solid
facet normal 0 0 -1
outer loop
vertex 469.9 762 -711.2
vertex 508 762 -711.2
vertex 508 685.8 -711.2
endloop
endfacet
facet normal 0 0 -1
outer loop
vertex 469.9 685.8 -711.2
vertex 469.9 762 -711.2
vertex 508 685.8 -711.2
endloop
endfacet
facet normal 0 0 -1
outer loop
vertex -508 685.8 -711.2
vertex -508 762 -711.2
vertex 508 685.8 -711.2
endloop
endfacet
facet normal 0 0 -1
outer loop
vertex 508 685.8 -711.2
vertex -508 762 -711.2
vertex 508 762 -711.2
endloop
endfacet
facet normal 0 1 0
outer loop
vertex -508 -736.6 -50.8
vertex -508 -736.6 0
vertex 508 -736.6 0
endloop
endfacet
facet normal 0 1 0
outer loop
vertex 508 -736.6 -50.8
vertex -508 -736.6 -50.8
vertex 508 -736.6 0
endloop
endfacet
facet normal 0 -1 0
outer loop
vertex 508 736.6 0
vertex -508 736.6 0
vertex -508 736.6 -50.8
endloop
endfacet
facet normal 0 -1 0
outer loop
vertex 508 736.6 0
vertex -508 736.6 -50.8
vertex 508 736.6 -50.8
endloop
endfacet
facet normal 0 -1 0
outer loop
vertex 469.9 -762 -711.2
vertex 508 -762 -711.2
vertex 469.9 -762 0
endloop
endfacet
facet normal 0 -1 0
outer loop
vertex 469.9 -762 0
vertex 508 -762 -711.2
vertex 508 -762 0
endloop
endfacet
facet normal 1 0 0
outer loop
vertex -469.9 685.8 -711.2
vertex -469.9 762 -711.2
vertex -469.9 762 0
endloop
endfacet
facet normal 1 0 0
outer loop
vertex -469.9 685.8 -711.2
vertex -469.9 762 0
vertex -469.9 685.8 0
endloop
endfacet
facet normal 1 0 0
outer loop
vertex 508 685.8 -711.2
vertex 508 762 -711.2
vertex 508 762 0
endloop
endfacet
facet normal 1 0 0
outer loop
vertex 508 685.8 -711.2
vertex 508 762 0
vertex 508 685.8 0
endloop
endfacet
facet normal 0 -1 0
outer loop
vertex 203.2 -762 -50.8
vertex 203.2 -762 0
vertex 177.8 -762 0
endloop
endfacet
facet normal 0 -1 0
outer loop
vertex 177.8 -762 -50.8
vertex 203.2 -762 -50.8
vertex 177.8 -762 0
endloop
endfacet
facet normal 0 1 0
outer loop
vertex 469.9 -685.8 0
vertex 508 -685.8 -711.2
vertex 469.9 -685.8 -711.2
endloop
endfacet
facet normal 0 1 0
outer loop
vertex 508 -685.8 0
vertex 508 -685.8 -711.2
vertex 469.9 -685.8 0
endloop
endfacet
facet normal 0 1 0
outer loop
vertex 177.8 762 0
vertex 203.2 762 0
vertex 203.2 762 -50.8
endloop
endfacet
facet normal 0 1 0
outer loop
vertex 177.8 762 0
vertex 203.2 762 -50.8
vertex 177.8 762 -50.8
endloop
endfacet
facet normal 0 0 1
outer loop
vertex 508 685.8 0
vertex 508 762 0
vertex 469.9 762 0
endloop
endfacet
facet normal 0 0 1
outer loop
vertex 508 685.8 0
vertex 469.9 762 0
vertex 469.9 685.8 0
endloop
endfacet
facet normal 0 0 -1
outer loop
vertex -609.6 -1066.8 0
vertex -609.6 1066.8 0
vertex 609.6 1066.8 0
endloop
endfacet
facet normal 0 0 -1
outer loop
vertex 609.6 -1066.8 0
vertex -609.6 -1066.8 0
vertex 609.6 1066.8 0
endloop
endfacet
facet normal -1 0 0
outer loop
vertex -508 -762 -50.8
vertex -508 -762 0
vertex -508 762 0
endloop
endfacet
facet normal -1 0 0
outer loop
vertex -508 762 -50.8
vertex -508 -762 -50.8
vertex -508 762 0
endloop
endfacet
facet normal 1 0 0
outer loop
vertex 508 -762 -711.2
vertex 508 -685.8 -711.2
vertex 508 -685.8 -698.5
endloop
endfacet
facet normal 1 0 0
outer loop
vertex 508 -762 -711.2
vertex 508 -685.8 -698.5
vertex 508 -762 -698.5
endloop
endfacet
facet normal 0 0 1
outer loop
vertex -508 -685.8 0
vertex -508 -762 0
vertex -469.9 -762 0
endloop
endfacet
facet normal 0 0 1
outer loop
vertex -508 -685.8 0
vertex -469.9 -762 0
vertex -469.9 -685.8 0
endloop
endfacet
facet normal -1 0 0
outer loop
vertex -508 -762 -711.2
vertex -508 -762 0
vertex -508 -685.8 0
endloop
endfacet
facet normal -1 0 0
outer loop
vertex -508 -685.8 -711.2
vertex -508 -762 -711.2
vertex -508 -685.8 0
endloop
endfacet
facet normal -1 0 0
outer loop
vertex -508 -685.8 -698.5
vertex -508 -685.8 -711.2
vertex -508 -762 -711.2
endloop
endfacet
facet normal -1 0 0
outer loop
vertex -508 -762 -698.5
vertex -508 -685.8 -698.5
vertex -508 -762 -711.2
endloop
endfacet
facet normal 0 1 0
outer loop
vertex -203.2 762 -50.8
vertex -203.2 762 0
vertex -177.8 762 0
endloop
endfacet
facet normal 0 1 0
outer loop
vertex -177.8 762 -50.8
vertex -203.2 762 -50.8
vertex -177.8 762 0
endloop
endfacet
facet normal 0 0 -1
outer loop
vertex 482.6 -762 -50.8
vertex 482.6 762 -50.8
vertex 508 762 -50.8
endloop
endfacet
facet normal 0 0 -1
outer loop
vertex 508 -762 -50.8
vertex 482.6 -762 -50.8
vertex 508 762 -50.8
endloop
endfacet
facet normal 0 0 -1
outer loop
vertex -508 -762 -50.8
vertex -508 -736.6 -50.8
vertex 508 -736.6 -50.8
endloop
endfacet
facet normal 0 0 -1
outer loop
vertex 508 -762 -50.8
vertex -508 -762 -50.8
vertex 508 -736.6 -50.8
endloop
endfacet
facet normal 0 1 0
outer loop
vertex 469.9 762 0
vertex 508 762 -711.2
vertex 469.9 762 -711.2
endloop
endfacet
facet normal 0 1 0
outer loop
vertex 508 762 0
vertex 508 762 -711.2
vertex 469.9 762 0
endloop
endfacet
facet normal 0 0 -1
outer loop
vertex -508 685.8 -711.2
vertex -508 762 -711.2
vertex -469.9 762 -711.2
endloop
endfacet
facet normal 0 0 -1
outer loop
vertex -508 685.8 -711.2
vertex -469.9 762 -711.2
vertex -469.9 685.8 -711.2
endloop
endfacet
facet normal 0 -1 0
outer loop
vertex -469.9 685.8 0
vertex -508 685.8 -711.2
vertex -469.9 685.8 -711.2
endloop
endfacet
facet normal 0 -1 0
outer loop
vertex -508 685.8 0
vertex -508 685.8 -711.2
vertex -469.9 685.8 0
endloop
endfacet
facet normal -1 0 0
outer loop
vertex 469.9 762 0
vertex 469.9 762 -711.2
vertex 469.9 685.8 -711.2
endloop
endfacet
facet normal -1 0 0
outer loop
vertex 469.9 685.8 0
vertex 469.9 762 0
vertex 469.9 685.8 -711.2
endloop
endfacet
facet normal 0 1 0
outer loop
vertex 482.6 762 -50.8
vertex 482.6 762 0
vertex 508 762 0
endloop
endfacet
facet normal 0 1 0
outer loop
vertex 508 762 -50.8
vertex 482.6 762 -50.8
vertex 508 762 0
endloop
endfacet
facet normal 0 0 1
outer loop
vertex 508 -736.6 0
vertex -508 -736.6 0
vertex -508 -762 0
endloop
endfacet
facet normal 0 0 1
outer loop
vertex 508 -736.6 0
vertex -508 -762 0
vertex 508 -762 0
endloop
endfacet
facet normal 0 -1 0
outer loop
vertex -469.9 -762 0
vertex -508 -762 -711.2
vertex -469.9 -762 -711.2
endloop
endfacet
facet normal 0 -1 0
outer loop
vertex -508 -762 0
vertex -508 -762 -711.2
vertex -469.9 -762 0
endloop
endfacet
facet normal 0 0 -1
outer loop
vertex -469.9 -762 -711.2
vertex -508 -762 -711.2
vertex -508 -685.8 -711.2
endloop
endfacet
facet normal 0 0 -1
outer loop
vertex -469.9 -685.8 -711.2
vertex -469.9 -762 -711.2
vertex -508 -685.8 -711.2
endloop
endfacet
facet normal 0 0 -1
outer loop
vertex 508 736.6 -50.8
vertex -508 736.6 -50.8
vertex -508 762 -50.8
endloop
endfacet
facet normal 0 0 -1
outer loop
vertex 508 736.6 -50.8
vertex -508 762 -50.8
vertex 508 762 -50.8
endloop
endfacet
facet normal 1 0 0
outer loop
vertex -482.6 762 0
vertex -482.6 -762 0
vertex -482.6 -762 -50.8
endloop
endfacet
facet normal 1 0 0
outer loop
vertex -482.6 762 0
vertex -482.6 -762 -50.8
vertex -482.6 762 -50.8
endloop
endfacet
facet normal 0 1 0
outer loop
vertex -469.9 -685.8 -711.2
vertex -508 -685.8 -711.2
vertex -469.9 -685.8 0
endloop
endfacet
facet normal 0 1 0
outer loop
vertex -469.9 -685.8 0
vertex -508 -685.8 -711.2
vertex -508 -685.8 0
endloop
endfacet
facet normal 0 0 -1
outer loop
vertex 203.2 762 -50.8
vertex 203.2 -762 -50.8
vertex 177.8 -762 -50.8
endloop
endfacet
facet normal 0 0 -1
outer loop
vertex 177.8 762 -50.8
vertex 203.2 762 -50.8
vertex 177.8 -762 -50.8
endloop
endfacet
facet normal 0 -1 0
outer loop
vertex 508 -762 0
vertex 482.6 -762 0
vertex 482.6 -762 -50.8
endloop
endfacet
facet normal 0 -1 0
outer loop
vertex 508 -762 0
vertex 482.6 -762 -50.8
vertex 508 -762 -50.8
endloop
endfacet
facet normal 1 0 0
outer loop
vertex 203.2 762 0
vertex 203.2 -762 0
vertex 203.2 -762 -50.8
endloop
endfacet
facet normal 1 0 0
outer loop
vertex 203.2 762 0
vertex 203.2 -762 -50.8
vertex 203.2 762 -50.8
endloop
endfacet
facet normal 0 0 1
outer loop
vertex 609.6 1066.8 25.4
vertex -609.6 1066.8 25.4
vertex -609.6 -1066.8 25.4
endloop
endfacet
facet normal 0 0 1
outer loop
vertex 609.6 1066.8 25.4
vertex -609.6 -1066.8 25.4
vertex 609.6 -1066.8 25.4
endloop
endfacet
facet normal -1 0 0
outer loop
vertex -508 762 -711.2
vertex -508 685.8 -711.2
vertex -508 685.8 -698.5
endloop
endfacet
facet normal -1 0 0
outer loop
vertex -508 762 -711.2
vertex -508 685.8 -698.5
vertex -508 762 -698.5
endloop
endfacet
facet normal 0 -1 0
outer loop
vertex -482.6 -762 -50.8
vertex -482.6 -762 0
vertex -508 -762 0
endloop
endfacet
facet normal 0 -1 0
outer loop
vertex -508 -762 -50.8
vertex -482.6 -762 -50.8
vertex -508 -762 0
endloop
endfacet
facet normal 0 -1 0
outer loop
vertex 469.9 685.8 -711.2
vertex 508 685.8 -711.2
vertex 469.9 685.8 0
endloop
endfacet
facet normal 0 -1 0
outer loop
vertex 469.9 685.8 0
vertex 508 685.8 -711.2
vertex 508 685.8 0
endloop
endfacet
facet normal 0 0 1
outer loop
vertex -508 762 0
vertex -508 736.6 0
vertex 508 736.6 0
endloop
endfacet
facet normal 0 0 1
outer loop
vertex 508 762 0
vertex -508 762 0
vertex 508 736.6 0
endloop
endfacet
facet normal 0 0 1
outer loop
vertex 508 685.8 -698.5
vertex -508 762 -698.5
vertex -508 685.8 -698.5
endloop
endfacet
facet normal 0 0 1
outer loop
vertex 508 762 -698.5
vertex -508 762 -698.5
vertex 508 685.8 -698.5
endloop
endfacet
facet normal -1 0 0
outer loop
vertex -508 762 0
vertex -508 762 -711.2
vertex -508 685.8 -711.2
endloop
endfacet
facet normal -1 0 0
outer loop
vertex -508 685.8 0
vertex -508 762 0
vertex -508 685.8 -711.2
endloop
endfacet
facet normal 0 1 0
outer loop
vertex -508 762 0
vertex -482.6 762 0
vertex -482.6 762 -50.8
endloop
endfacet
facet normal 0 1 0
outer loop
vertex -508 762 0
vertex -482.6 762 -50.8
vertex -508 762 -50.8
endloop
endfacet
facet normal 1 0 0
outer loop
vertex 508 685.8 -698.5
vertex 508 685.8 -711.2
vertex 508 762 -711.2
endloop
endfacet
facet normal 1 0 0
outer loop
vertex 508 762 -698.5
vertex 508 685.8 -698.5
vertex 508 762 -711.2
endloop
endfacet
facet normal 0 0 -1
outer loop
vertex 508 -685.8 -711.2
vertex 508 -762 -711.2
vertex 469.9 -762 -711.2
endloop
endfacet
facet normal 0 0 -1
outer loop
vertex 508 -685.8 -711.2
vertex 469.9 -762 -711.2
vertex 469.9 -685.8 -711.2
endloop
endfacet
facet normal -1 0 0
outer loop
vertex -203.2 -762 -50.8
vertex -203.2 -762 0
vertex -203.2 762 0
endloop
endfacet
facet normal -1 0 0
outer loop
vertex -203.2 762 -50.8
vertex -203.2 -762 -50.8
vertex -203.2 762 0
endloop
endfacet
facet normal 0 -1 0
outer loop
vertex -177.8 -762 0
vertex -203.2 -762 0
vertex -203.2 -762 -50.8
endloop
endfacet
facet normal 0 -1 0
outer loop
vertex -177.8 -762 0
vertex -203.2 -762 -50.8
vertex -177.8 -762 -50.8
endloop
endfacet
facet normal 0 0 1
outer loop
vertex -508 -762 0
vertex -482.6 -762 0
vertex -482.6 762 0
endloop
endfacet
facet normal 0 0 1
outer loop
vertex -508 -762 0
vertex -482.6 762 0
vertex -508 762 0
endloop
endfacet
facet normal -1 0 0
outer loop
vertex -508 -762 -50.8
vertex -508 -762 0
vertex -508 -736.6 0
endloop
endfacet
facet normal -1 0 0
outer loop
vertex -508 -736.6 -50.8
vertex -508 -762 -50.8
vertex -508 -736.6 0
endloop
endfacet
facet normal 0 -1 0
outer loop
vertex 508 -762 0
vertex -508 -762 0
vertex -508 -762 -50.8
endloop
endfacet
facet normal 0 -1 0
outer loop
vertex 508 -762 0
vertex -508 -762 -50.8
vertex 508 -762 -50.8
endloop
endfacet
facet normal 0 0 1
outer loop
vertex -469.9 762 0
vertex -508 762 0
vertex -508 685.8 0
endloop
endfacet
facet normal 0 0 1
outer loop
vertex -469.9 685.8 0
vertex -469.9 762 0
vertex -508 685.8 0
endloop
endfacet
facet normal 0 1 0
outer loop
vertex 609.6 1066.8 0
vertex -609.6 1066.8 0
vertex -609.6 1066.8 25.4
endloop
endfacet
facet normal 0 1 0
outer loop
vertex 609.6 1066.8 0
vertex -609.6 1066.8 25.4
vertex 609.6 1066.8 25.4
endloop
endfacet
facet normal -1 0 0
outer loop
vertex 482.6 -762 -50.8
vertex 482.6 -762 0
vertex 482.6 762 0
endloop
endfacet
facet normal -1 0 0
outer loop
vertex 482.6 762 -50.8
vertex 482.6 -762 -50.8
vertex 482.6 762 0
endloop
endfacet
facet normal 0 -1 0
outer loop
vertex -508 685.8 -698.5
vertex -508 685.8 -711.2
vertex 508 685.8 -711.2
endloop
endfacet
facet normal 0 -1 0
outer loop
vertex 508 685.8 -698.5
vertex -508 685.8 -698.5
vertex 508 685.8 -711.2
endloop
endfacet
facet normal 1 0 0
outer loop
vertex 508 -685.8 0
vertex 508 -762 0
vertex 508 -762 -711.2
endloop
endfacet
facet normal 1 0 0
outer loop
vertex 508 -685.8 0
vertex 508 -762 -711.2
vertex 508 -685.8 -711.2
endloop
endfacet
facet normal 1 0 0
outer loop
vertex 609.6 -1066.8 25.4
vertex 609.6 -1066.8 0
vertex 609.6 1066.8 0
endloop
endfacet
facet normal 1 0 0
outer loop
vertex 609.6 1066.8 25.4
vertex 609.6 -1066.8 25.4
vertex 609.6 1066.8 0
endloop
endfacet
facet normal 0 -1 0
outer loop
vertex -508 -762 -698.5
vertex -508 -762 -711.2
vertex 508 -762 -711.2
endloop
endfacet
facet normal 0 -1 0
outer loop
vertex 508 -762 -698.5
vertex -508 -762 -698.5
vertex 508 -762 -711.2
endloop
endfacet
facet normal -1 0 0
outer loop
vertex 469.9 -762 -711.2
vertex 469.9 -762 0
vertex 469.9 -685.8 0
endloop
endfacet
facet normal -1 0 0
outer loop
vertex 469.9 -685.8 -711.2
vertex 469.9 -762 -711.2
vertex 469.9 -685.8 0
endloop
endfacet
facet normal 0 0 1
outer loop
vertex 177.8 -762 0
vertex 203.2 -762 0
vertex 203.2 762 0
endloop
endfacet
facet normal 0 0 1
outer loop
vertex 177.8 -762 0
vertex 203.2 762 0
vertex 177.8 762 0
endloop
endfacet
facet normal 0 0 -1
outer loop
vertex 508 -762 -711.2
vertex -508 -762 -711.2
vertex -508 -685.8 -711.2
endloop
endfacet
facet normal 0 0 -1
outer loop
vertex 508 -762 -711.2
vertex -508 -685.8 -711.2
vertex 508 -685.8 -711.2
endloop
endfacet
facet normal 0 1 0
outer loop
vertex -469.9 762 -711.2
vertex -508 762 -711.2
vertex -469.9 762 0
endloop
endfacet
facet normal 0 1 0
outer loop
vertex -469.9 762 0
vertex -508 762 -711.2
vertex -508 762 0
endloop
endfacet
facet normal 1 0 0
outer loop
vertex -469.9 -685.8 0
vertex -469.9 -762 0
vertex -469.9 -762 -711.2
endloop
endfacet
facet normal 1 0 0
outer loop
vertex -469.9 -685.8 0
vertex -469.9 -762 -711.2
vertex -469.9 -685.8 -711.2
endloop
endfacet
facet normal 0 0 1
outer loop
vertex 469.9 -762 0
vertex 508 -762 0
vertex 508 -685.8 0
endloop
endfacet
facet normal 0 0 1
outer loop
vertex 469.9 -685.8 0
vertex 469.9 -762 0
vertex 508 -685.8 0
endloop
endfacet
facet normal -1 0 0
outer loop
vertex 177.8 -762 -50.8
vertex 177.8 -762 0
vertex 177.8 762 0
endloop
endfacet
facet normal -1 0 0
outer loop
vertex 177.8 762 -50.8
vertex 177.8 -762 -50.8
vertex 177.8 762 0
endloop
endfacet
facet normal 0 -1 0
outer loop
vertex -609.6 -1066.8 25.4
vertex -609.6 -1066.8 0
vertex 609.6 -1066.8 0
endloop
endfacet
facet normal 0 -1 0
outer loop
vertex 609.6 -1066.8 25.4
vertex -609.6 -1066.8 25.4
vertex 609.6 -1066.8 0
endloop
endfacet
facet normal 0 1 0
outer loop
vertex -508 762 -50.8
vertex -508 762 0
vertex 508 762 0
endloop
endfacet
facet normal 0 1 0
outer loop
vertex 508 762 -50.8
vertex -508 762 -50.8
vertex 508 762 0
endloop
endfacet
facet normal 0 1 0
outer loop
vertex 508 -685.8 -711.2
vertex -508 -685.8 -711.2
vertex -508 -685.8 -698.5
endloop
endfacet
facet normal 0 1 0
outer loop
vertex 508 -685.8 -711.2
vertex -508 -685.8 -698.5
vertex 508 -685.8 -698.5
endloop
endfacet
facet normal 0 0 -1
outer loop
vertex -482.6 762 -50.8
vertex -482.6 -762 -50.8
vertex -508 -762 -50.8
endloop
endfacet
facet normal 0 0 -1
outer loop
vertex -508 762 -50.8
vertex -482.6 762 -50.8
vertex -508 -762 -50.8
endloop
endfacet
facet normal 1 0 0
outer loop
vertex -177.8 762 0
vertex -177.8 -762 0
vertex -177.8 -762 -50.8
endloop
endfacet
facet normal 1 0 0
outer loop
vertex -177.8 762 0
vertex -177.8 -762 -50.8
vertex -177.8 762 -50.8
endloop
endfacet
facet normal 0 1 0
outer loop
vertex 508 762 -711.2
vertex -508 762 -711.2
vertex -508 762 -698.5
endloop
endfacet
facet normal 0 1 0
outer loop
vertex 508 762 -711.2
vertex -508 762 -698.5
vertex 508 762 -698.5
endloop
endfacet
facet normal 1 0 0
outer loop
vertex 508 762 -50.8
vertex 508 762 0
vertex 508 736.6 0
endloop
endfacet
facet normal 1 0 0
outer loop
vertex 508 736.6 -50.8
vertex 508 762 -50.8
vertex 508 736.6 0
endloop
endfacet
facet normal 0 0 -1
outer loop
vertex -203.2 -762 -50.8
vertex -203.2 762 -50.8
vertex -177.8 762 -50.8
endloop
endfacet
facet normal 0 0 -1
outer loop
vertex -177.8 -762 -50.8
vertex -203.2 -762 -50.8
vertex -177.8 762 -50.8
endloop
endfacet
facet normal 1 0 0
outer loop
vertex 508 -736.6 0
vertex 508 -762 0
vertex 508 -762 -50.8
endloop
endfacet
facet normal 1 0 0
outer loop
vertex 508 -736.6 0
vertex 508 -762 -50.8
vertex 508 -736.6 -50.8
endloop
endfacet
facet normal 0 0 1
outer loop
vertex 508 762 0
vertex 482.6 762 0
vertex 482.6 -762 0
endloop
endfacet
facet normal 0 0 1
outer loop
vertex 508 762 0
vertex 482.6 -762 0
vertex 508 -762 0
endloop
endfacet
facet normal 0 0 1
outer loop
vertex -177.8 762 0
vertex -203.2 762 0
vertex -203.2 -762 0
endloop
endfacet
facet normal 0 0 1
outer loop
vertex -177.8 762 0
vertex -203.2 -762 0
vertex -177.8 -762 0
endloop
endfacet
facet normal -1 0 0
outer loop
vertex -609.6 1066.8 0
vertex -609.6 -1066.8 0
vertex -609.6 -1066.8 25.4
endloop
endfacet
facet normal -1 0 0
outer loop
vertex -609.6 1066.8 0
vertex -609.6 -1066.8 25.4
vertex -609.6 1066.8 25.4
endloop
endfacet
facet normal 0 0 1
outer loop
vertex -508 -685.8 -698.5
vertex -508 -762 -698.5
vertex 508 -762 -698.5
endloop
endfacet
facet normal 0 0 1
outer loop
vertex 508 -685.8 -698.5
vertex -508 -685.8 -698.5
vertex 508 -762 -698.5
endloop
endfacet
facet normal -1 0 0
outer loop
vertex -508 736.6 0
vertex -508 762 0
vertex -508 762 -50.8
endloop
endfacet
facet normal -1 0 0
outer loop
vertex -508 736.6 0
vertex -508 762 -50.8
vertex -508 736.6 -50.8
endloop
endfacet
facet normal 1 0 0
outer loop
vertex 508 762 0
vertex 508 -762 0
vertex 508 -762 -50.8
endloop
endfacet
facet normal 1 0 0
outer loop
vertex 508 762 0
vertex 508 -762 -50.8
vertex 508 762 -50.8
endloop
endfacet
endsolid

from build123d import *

# Parameters (mm, degrees)
F0_W      = 1219.2
F0_H      = 2133.6
F1_DEPTH  = 25.4
F2_W      = 25.4
F2_H      = 1524
F3_DEPTH  = 50.8
F5_W      = 1016
F5_H      = 25.4
F6_DEPTH  = 50.8
F8_W      = 76.2
F8_H      = 711.2
F9_DEPTH  = 38.1
F12_W     = 1016
F12_H     = 76.2
F13_DEPTH = 12.7
F15_W     = 25.4
F15_H     = 1524
F16_DEPTH = 50.8


# Not quite as in the source:
# - a feature names something its author has since deleted; it is built from what else it names


with BuildPart() as f1:
    # F0 (on Top) → F1 (new body)
    with BuildSketch(Plane.XY):
        Rectangle(F0_W, F0_H)
    extrude(amount=F1_DEPTH)


with BuildPart() as f3:
    # F2 (on face) → F3 (new body)
    with BuildSketch(Plane.XY):
        with Locations((495.3, 0)):
            Rectangle(F2_W, F2_H)
    extrude(amount=-F3_DEPTH)


with BuildPart() as f4_1:
    # F4: instance of F3
    add(f3.part.mirror(Plane.YZ))


with BuildPart() as f6:
    # F5 (on face) → F6 (new body)
    with BuildSketch(Plane.XY):
        with Locations((0, -749.3)):
            Rectangle(F5_W, F5_H)
    extrude(amount=-F6_DEPTH)


with BuildPart() as f7_1:
    # F7: instance of F6
    add(f6.part.mirror(Plane.XZ))


with BuildPart() as f9:
    # F8 (on face) → F9 (new body)
    with BuildSketch(Plane(origin=(-508, 0, 0), x_dir=(0, -1, 0), z_dir=(-1, 0, 0))):
        with Locations((-723.9, -355.6)):
            Rectangle(F8_W, F8_H)
    extrude(amount=-F9_DEPTH)


with BuildPart() as f10_1:
    # F10: instance of F9
    add(f9.part.mirror(Plane.YZ))


with BuildPart() as f11_1:
    # F11: instance of F10_1
    add(f10_1.part.mirror(Plane.XZ))


with BuildPart() as f11_2:
    # F11: instance of F9
    add(f9.part.mirror(Plane.XZ))


with BuildPart() as f13:
    # F12 (on face) → F13 (new body)
    with BuildSketch(Plane(origin=(0, 0, -711.2), x_dir=(1, 0, 0), z_dir=(0, 0, -1))):
        with Locations((0, 723.9)):
            Rectangle(F12_W, F12_H)
    extrude(amount=-F13_DEPTH)


with BuildPart() as f14_1:
    # F14: instance of F13
    add(f13.part.mirror(Plane.XZ))


with BuildPart() as f16:
    # F15 (on face) → F16 (new body)
    with BuildSketch(Plane.XY):
        with Locations((-190.5, 0)):
            Rectangle(F15_W, F15_H)
    extrude(amount=-F16_DEPTH)


with BuildPart() as f17_1:
    # F17: instance of F16
    add(f16.part.mirror(Plane.YZ))


solid = Compound([f1.part, f3.part, f4_1.part, f6.part, f7_1.part, f9.part, f10_1.part, f11_1.part, f11_2.part, f13.part, f14_1.part, f16.part, f17_1.part])
